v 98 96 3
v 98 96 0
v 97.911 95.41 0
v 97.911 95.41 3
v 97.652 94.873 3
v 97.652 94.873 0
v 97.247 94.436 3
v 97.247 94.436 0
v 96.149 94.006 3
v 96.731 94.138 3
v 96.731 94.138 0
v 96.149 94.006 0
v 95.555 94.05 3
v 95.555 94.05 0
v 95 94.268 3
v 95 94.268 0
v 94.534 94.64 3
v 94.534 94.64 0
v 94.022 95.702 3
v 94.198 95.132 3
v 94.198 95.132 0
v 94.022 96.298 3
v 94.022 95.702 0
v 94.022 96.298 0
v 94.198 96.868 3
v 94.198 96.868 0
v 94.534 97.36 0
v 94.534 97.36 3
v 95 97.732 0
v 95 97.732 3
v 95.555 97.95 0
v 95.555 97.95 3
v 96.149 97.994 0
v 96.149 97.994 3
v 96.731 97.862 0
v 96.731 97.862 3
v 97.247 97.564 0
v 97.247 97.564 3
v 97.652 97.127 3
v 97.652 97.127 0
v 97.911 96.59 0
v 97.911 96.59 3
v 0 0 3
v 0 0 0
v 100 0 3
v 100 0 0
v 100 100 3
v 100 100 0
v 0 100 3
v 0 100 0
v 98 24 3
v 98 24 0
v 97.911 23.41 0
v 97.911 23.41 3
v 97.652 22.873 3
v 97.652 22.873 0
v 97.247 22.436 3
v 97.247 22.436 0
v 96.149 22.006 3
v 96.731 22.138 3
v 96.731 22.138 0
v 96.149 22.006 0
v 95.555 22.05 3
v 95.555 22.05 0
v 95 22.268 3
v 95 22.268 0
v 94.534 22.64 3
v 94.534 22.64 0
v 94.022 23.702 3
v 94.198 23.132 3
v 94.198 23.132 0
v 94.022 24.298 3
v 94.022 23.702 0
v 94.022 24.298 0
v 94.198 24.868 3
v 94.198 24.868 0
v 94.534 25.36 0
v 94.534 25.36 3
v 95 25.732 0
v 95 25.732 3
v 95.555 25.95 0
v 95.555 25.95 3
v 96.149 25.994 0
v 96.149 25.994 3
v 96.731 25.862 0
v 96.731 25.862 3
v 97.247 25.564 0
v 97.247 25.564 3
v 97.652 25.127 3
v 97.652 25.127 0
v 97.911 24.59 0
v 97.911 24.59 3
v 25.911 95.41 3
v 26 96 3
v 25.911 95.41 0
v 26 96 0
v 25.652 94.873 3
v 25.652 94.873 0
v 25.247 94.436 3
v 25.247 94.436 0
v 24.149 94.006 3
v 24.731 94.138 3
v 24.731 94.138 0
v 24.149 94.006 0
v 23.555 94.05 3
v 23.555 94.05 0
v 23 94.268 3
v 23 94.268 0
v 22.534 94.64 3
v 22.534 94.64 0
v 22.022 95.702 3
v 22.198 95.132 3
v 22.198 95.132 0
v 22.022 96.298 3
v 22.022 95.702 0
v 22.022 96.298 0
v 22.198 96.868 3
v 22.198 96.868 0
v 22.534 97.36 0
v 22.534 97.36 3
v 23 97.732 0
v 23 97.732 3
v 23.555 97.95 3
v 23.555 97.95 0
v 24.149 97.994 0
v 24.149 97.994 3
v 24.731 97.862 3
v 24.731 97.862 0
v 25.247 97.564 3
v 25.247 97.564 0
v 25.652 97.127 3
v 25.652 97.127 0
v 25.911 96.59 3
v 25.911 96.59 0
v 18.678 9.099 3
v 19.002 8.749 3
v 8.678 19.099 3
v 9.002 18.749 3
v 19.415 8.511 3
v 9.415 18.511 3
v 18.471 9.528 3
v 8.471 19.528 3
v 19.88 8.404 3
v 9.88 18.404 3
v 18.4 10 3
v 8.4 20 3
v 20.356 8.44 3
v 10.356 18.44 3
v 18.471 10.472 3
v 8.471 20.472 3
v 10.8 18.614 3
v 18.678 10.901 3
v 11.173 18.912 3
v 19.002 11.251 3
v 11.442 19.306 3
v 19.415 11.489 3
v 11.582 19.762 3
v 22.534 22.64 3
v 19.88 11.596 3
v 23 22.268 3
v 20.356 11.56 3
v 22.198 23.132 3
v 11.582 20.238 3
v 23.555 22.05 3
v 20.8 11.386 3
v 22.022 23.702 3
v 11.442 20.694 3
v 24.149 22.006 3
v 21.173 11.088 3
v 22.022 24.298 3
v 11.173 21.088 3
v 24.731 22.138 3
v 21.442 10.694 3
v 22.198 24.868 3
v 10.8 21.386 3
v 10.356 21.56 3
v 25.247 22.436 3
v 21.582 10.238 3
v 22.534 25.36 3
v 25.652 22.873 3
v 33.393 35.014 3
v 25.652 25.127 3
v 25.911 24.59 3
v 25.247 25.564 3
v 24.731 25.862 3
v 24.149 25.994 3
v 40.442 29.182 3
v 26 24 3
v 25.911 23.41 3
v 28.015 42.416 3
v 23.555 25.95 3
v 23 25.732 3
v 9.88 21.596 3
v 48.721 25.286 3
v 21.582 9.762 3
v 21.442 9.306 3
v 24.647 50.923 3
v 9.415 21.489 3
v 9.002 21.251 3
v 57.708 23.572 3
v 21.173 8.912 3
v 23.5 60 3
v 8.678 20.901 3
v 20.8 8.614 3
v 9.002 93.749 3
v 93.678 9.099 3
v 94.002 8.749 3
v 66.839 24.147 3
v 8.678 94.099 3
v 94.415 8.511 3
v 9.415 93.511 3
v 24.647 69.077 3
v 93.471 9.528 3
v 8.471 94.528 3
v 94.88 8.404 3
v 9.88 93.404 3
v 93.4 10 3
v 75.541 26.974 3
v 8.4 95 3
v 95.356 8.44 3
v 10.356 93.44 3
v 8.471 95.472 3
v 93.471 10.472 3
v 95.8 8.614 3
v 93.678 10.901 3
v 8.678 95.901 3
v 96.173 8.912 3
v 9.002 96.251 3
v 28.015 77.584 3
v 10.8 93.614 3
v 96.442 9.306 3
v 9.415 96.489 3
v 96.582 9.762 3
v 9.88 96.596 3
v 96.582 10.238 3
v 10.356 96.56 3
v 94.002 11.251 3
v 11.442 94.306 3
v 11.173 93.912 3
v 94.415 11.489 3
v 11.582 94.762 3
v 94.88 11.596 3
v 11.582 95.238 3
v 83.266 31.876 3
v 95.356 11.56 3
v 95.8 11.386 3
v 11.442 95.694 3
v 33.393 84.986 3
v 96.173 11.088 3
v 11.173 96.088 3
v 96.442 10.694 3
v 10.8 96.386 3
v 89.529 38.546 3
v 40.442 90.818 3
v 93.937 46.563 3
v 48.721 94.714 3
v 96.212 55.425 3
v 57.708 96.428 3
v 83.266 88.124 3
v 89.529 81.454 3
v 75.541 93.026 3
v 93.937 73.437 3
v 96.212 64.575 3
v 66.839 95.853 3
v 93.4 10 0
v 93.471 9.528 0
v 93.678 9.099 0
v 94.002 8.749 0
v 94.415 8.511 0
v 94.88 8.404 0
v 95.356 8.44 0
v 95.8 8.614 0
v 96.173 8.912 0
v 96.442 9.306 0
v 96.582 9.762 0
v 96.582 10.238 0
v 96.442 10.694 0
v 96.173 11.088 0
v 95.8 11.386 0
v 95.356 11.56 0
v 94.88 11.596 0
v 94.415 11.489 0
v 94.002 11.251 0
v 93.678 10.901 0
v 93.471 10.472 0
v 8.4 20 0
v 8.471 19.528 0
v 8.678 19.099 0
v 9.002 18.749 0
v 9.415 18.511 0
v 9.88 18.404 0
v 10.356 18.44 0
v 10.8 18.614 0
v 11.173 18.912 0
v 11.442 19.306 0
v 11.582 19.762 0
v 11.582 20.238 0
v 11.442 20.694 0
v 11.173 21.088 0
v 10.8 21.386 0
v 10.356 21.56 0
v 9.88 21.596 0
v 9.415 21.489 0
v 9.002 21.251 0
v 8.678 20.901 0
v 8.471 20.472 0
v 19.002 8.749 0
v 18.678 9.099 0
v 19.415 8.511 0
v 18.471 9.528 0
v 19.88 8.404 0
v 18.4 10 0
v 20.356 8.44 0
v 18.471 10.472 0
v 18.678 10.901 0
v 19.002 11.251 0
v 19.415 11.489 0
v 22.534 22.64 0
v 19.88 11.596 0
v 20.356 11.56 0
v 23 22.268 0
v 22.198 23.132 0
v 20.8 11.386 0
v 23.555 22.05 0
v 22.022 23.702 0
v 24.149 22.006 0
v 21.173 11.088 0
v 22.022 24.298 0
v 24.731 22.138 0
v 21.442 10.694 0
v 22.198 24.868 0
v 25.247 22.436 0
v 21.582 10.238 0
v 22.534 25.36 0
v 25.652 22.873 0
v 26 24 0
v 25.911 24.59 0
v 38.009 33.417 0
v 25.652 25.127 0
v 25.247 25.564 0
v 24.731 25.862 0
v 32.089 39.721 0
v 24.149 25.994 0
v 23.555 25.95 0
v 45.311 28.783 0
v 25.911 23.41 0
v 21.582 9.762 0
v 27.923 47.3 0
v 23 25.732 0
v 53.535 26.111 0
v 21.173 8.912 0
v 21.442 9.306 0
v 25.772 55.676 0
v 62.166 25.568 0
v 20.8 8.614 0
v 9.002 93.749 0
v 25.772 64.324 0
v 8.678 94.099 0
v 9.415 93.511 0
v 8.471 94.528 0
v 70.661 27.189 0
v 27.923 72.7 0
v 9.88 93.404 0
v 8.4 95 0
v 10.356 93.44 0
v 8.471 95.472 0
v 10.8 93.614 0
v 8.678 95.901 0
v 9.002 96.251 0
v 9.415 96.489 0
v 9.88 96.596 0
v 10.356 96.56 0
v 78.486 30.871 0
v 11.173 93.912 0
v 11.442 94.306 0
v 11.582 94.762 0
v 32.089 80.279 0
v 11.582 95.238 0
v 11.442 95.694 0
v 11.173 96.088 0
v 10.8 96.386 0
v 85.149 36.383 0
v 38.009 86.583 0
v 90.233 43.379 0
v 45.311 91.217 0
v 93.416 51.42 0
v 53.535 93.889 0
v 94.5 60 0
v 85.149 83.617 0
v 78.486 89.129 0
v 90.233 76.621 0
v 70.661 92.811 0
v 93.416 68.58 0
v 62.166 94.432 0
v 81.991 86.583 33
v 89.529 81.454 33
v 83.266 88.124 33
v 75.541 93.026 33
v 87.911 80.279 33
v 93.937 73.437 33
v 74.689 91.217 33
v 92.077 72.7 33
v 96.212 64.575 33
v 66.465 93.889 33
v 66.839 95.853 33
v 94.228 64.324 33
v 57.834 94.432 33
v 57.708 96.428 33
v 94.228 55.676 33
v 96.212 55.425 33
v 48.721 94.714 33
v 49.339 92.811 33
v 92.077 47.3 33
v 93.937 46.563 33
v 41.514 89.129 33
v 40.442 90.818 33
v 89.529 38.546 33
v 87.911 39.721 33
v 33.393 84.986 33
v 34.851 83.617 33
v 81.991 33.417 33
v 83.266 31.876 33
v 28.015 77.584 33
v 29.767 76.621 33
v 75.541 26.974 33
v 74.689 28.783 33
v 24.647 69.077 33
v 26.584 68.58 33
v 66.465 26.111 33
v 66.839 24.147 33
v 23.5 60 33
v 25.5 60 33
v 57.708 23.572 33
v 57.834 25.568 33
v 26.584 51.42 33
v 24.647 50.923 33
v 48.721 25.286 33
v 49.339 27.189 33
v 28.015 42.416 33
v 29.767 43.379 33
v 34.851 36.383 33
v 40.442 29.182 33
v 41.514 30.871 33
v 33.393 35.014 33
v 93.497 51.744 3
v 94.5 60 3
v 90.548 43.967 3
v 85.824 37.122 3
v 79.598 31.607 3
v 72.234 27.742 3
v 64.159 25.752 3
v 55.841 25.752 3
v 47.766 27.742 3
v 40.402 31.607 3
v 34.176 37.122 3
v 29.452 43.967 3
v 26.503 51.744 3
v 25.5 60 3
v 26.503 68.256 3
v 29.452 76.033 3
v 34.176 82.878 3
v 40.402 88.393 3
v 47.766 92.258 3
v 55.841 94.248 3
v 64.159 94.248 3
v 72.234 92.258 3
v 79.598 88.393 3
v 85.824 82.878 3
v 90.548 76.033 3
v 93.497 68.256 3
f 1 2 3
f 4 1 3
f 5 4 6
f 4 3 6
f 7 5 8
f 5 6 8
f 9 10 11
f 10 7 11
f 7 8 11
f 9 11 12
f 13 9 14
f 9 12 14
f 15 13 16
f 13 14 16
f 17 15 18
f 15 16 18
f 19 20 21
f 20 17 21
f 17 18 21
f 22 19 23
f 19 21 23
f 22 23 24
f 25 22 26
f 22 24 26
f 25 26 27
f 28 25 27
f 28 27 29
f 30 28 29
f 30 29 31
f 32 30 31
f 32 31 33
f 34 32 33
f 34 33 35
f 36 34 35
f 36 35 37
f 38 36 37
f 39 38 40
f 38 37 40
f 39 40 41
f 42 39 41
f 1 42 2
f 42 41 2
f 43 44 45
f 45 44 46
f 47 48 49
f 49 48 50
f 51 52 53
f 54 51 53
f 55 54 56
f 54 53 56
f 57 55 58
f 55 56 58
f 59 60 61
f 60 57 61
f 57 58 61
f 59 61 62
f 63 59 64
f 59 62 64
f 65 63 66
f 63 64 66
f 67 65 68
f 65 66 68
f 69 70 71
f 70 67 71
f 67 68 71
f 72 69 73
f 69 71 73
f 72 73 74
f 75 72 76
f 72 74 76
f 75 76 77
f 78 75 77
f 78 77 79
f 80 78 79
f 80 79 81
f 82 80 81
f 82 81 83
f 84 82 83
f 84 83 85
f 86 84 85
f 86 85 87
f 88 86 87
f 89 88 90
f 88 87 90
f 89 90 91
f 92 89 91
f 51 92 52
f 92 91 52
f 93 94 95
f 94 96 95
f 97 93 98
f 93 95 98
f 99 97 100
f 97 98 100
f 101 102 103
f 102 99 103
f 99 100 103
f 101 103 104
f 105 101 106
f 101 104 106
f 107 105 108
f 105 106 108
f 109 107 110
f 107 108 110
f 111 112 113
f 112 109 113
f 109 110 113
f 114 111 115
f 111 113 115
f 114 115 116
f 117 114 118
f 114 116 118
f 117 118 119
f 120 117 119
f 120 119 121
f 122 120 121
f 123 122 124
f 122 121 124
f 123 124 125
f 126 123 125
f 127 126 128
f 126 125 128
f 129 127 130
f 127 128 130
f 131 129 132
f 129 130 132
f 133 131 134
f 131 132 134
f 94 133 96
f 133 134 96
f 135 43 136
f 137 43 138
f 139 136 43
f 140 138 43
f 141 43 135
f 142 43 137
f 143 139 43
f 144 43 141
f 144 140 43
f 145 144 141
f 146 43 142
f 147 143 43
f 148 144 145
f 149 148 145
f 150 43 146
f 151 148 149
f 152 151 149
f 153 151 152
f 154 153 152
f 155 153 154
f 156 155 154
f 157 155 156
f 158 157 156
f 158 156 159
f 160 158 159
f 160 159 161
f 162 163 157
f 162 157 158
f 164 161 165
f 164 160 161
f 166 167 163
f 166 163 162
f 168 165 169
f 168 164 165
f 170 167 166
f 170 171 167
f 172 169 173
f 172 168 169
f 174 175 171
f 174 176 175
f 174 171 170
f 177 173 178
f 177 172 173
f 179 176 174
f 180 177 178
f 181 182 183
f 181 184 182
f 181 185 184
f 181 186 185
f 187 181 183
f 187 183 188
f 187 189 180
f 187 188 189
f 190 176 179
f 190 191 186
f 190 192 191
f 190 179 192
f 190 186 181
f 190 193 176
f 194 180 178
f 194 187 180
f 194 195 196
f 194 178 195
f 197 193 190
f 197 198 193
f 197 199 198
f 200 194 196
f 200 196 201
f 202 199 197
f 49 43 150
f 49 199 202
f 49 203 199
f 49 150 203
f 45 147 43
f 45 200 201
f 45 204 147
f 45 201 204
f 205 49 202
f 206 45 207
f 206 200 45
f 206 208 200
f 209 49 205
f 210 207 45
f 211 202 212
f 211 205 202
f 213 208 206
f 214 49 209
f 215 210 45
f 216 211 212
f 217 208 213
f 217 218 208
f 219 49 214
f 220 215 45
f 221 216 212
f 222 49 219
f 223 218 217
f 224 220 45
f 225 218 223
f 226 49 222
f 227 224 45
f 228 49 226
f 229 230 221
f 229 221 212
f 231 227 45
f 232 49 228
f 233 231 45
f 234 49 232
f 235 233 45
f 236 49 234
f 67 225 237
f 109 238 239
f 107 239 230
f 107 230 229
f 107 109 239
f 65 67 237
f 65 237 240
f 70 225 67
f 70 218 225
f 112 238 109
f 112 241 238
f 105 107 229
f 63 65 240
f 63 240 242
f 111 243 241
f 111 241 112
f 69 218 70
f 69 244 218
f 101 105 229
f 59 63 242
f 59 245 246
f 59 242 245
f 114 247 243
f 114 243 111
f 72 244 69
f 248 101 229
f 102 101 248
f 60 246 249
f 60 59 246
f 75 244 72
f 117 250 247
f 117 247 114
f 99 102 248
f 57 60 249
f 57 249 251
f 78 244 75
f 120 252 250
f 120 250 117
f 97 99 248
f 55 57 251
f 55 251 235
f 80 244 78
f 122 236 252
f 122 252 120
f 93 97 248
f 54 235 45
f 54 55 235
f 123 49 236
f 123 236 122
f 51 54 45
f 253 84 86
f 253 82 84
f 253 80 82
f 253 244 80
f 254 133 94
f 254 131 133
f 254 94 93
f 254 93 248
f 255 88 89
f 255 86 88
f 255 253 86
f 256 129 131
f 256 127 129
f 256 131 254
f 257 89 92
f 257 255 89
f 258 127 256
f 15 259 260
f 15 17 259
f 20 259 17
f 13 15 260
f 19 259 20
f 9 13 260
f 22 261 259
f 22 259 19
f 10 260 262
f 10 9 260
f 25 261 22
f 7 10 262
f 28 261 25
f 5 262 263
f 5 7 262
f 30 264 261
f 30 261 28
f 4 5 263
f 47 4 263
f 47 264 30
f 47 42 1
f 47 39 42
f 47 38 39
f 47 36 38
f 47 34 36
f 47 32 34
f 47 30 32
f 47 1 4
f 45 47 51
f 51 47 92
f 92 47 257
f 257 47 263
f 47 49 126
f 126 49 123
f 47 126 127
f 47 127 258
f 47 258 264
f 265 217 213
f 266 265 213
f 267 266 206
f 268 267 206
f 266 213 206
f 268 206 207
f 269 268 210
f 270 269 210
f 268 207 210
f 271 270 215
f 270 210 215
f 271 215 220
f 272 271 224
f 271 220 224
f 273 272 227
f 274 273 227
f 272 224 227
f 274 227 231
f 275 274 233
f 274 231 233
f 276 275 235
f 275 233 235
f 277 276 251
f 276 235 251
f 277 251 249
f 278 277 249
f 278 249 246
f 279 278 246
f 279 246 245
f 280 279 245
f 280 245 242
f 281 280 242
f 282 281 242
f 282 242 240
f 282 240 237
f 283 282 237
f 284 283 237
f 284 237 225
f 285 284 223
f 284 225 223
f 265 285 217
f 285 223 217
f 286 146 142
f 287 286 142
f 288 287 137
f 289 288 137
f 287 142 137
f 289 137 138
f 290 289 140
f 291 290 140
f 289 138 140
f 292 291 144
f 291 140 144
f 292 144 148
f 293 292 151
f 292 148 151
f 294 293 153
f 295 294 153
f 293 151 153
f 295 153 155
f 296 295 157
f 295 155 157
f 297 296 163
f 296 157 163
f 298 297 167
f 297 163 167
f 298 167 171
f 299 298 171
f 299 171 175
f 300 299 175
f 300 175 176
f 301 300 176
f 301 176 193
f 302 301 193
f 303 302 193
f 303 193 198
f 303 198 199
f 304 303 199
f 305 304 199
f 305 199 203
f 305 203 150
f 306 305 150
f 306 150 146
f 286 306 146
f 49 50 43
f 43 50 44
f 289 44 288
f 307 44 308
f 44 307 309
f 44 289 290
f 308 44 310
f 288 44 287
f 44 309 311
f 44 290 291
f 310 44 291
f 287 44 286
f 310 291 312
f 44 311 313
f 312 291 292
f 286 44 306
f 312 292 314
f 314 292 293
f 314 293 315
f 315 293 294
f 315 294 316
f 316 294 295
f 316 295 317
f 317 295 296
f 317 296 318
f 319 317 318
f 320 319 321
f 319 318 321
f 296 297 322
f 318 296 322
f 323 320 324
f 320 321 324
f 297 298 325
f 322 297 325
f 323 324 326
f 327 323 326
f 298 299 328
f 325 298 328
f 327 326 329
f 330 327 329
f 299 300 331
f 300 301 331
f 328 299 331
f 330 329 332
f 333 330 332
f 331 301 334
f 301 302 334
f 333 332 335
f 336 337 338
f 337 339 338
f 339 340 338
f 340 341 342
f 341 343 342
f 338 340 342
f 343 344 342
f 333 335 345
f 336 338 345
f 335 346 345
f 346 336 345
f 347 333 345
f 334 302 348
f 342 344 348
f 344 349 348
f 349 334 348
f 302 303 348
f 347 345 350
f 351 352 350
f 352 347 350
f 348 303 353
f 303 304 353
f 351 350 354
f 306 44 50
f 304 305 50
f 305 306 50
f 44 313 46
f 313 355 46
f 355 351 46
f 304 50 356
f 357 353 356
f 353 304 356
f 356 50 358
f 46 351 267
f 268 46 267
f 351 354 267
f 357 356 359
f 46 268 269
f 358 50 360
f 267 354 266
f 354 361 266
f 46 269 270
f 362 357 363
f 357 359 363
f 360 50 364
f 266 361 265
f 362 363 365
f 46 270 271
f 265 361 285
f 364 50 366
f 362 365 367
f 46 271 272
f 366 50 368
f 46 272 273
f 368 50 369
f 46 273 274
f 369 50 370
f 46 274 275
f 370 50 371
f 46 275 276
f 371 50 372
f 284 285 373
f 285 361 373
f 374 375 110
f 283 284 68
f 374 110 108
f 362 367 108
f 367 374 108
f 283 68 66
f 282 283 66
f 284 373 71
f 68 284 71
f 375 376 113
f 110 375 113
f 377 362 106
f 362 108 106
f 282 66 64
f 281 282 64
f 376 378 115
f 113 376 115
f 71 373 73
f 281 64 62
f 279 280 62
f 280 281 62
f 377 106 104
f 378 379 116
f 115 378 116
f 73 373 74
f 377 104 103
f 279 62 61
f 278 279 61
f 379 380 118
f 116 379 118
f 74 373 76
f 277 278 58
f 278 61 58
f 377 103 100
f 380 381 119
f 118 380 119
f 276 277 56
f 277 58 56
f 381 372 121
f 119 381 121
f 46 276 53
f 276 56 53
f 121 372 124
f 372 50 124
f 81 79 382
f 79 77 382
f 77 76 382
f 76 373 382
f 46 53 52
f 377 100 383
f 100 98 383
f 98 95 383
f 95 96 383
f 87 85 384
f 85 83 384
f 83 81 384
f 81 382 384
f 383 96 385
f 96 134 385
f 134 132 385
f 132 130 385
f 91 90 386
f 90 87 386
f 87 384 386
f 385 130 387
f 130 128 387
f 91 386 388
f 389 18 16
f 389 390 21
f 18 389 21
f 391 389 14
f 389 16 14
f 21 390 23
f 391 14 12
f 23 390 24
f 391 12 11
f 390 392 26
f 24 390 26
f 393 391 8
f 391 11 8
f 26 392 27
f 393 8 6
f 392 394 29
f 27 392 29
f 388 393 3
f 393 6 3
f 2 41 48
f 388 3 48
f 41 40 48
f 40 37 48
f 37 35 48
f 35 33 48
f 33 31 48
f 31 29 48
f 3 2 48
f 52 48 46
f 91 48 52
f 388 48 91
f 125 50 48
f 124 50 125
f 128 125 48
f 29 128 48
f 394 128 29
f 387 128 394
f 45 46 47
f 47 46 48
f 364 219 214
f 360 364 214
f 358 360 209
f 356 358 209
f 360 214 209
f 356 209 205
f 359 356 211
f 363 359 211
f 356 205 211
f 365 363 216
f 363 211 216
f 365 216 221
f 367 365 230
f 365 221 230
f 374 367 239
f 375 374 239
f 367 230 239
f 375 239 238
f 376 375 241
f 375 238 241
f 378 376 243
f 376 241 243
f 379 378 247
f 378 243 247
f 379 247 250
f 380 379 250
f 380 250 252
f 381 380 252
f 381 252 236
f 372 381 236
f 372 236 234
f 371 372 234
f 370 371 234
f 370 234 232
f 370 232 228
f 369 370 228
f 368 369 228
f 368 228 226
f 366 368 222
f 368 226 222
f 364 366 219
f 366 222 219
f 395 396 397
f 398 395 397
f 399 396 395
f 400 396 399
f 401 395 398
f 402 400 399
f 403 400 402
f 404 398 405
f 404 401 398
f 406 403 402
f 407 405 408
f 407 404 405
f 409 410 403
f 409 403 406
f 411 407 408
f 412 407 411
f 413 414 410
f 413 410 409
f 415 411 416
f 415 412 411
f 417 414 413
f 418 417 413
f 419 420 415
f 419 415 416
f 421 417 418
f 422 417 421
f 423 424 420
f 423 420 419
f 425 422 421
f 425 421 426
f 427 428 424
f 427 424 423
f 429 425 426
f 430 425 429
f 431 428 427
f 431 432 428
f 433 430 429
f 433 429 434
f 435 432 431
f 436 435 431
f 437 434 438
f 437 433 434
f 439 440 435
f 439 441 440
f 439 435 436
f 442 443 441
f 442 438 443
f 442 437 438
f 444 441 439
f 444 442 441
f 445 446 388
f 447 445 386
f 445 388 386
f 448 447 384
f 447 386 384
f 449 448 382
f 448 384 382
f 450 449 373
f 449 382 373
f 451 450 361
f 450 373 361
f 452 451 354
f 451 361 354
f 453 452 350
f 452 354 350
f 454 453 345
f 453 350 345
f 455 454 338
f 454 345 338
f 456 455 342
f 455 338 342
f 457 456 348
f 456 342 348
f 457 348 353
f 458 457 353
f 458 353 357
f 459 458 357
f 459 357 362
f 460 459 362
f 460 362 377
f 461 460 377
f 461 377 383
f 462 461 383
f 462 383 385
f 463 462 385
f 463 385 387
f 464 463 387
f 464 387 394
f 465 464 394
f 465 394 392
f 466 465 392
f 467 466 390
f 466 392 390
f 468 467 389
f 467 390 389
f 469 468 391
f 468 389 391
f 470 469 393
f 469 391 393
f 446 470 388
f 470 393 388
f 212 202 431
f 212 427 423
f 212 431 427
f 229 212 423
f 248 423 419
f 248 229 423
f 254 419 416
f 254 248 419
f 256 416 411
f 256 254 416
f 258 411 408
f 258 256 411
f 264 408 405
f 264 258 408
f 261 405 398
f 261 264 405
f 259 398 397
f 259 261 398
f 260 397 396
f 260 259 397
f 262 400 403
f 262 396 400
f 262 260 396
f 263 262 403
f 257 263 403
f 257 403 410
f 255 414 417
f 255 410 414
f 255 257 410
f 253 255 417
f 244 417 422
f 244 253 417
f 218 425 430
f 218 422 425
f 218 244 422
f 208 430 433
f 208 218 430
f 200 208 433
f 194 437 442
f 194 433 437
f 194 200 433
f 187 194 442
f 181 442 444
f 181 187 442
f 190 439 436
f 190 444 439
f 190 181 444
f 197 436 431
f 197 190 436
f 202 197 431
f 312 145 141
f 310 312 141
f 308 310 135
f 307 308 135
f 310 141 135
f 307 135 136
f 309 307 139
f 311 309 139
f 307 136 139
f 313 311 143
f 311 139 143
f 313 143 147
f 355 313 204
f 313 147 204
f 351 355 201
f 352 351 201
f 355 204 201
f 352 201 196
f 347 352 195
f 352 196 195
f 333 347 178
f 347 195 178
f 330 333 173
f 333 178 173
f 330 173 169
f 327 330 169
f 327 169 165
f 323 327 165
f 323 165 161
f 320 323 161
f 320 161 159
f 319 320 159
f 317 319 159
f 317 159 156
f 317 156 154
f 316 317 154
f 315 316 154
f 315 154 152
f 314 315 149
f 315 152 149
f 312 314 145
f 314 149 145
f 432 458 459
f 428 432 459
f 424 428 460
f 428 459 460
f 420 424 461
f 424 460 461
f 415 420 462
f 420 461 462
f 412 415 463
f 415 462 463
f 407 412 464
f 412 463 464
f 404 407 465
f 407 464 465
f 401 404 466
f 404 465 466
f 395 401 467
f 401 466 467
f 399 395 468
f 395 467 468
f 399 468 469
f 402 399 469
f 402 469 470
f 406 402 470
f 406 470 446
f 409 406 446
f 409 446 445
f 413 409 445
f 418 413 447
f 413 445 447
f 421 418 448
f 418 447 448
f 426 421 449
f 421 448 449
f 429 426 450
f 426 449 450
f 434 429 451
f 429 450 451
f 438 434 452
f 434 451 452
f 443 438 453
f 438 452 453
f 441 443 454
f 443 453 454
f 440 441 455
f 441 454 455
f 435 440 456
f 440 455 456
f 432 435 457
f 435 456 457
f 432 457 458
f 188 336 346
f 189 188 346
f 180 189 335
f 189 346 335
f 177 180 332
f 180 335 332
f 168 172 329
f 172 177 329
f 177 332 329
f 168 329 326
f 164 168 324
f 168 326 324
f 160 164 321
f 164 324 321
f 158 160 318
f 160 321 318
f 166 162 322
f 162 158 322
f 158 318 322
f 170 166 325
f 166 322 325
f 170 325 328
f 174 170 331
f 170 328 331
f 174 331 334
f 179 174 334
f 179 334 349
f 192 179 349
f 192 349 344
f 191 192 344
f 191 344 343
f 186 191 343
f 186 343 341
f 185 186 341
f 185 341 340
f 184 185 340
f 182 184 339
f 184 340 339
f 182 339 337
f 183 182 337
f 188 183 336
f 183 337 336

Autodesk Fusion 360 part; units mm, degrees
sketch "Skizze1" plane through (0, 0, 0) normal (0, 0, 1) x (1, 0, 0)
  line L0 (0, 0) -> (100, 0)
  line L1 (100, 0) -> (100, 100)
  line L2 (100, 100) -> (0, 100)
  line L3 (0, 100) -> (0, 0)
  line L4 (100, 100) -> (20, 100)
  line L5 (20, 100) -> (20, 20)
  line L6 (20, 20) -> (100, 20)
  line L7 (100, 20) -> (100, 100)
  circle A0 centre (96, 24) radius 2
  circle A1 centre (24, 96) radius 2
  circle A2 centre (96, 96) radius 2
  circle A3 centre (24, 24) radius 2
  circle A4 centre (60, 60) radius 34.5
  dimension "d1" = 100
  dimension "d2" = 100
  dimension "d3" = 80
  dimension "d4" = 80
  dimension "d5" = 72
  dimension "d6" = 72
  dimension "d9" = 4
  dimension "d10" = 4
  dimension "d11" = 4
  dimension "d12" = 4
  dimension "d13" = 69
extrude "Extrusion1" add sketch "Skizze1" along normal blind 3
sketch "Skizze2" plane through (0, 0, 3) normal (0, 0, 1) x (-1, 0, 0)
  circle A0 centre (-24, -24) radius 2
  circle A1 centre (-60, -60) radius 34.5
  circle A2 centre (-96, -24) radius 2
  circle A3 centre (-96, -96) radius 2
  circle A4 centre (-24, -96) radius 2
  line L0 (-100, 0) -> (-100, -100)
  line L1 (-100, -100) -> (0, -100)
  line L2 (0, -100) -> (0, 0)
  line L3 (0, 0) -> (-100, 0)
  circle A5 centre (-95, -10) radius 1.6
  circle A6 centre (-20, -10) radius 1.6
  circle A7 centre (-10, -20) radius 1.6
  circle A8 centre (-10, -95) radius 1.6
  dimension "d17" = 3.2
  dimension "d18" = 3.2
  dimension "d19" = 3.2
  dimension "d20" = 3.2
extrude "Extrusion2" cut sketch "Skizze2" against normal blind 10 contours A5 | A6 | A7 | A8
sketch "Skizze3" plane through (0, 0, 3) normal (0, 0, 1) x (-1, 0, 0)
  circle A0 centre (-10, -20) radius 1.6
  circle A1 centre (-95, -10) radius 1.6
  circle A2 centre (-20, -10) radius 1.6
  circle A3 centre (-10, -95) radius 1.6
  circle A4 centre (-96, -96) radius 2
  circle A5 centre (-24, -24) radius 2
  circle A6 centre (-24, -96) radius 2
  circle A7 centre (-60, -60) radius 34.5
  circle A8 centre (-96, -24) radius 2
  line L0 (-100, 0) -> (-100, -100)
  line L1 (-100, -100) -> (0, -100)
  line L2 (0, -100) -> (0, 0)
  line L3 (0, 0) -> (-100, 0)
  circle A9 centre (-60, -60) radius 36.5
  dimension "d23" = 73
extrude "Extrusion3" add sketch "Skizze3" along normal blind 30 contours A9
